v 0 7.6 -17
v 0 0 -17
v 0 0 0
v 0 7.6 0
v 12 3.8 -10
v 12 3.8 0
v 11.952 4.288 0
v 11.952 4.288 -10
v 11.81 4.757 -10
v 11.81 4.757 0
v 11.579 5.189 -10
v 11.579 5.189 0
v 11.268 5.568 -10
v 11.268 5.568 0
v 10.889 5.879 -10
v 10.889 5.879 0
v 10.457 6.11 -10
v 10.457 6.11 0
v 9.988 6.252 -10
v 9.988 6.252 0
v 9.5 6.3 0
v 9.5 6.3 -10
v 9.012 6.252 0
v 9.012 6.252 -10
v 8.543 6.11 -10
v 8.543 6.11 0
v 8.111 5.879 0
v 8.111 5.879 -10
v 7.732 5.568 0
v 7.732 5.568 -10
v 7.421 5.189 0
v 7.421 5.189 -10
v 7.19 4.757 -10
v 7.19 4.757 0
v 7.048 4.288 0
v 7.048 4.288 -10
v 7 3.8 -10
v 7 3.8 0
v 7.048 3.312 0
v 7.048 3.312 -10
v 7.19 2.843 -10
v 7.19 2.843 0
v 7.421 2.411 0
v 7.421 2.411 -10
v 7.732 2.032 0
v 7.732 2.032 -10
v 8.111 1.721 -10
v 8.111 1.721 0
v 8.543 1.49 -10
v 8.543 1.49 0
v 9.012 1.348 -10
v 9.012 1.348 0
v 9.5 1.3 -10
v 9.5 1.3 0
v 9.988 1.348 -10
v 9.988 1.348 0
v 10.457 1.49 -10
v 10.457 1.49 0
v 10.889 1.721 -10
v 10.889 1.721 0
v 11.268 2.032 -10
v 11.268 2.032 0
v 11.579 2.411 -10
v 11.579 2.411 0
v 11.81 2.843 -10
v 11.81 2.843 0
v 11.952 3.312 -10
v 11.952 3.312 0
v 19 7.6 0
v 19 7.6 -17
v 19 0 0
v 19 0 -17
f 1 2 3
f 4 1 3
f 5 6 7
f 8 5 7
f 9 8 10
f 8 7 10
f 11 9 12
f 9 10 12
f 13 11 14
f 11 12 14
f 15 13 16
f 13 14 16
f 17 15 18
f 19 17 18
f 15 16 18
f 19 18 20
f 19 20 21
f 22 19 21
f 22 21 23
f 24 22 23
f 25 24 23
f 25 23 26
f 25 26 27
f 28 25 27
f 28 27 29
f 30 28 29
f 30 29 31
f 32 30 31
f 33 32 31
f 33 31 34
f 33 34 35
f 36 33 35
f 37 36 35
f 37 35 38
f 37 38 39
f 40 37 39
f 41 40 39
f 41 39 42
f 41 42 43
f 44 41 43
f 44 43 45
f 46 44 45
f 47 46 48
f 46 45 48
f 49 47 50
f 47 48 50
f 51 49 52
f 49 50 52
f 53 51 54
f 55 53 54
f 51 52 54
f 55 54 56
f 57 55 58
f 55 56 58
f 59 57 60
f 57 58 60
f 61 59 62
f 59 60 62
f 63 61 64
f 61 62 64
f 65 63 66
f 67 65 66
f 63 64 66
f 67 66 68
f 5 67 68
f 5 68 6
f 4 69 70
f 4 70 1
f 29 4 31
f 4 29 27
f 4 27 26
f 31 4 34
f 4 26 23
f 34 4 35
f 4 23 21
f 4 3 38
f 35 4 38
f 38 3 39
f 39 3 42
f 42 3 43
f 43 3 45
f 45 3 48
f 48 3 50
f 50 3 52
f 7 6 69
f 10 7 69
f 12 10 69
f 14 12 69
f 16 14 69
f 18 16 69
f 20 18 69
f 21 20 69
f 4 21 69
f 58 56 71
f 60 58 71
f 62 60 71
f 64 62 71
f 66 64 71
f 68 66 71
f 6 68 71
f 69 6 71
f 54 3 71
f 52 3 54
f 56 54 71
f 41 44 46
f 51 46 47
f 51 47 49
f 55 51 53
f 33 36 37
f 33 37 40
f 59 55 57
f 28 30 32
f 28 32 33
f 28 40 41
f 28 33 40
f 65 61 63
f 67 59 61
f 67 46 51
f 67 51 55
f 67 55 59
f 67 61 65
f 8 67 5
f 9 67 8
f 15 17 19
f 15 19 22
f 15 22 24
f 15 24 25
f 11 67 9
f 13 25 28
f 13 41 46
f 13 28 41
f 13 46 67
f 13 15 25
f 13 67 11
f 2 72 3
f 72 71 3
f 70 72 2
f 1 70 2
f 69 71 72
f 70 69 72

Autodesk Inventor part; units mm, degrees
ref_plane "YZ Plane" through (0, 0, 0) normal (1, 0, 0) x (0, 1, 0)
ref_plane "XZ Plane" through (0, 0, 0) normal (0, 1, 0) x (-1, 0, 0)
ref_plane "XY Plane" through (0, 0, 0) normal (0, 0, 1) x (1, 0, 0)
sketch "스케치1" plane through (0, 0, 0) normal (0, 1, 0) x (-1, 0, 0)
  line L0 (0, 0) -> (-19, 0)
  line L1 (-19, 0) -> (-19, -17)
  line L2 (-19, -17) -> (0, -17)
  line L3 (0, -17) -> (0, 0)
  dimension "d0" = 17
  dimension "d1" = 19
extrude "돌출1" add sketch "스케치1" along normal blind 7.6
sketch "스케치2" plane through (0, 0, 0) normal (0, 0, 1) x (1, 0, 0)
  circle A0 centre (9.5, 3.8) radius 2.5
  line L0 (0, 7.6) -> (19, 7.6) projected
  line L1 (19, 0) -> (19, 7.6) projected
  point P0 (0, 0)
  point P1 (9.5, 7.6)
  point P2 (19, 3.8)
  dimension "d4" = 5
extrude "돌출2" cut sketch "스케치2" against normal blind 10
properties part number "loadcell"
